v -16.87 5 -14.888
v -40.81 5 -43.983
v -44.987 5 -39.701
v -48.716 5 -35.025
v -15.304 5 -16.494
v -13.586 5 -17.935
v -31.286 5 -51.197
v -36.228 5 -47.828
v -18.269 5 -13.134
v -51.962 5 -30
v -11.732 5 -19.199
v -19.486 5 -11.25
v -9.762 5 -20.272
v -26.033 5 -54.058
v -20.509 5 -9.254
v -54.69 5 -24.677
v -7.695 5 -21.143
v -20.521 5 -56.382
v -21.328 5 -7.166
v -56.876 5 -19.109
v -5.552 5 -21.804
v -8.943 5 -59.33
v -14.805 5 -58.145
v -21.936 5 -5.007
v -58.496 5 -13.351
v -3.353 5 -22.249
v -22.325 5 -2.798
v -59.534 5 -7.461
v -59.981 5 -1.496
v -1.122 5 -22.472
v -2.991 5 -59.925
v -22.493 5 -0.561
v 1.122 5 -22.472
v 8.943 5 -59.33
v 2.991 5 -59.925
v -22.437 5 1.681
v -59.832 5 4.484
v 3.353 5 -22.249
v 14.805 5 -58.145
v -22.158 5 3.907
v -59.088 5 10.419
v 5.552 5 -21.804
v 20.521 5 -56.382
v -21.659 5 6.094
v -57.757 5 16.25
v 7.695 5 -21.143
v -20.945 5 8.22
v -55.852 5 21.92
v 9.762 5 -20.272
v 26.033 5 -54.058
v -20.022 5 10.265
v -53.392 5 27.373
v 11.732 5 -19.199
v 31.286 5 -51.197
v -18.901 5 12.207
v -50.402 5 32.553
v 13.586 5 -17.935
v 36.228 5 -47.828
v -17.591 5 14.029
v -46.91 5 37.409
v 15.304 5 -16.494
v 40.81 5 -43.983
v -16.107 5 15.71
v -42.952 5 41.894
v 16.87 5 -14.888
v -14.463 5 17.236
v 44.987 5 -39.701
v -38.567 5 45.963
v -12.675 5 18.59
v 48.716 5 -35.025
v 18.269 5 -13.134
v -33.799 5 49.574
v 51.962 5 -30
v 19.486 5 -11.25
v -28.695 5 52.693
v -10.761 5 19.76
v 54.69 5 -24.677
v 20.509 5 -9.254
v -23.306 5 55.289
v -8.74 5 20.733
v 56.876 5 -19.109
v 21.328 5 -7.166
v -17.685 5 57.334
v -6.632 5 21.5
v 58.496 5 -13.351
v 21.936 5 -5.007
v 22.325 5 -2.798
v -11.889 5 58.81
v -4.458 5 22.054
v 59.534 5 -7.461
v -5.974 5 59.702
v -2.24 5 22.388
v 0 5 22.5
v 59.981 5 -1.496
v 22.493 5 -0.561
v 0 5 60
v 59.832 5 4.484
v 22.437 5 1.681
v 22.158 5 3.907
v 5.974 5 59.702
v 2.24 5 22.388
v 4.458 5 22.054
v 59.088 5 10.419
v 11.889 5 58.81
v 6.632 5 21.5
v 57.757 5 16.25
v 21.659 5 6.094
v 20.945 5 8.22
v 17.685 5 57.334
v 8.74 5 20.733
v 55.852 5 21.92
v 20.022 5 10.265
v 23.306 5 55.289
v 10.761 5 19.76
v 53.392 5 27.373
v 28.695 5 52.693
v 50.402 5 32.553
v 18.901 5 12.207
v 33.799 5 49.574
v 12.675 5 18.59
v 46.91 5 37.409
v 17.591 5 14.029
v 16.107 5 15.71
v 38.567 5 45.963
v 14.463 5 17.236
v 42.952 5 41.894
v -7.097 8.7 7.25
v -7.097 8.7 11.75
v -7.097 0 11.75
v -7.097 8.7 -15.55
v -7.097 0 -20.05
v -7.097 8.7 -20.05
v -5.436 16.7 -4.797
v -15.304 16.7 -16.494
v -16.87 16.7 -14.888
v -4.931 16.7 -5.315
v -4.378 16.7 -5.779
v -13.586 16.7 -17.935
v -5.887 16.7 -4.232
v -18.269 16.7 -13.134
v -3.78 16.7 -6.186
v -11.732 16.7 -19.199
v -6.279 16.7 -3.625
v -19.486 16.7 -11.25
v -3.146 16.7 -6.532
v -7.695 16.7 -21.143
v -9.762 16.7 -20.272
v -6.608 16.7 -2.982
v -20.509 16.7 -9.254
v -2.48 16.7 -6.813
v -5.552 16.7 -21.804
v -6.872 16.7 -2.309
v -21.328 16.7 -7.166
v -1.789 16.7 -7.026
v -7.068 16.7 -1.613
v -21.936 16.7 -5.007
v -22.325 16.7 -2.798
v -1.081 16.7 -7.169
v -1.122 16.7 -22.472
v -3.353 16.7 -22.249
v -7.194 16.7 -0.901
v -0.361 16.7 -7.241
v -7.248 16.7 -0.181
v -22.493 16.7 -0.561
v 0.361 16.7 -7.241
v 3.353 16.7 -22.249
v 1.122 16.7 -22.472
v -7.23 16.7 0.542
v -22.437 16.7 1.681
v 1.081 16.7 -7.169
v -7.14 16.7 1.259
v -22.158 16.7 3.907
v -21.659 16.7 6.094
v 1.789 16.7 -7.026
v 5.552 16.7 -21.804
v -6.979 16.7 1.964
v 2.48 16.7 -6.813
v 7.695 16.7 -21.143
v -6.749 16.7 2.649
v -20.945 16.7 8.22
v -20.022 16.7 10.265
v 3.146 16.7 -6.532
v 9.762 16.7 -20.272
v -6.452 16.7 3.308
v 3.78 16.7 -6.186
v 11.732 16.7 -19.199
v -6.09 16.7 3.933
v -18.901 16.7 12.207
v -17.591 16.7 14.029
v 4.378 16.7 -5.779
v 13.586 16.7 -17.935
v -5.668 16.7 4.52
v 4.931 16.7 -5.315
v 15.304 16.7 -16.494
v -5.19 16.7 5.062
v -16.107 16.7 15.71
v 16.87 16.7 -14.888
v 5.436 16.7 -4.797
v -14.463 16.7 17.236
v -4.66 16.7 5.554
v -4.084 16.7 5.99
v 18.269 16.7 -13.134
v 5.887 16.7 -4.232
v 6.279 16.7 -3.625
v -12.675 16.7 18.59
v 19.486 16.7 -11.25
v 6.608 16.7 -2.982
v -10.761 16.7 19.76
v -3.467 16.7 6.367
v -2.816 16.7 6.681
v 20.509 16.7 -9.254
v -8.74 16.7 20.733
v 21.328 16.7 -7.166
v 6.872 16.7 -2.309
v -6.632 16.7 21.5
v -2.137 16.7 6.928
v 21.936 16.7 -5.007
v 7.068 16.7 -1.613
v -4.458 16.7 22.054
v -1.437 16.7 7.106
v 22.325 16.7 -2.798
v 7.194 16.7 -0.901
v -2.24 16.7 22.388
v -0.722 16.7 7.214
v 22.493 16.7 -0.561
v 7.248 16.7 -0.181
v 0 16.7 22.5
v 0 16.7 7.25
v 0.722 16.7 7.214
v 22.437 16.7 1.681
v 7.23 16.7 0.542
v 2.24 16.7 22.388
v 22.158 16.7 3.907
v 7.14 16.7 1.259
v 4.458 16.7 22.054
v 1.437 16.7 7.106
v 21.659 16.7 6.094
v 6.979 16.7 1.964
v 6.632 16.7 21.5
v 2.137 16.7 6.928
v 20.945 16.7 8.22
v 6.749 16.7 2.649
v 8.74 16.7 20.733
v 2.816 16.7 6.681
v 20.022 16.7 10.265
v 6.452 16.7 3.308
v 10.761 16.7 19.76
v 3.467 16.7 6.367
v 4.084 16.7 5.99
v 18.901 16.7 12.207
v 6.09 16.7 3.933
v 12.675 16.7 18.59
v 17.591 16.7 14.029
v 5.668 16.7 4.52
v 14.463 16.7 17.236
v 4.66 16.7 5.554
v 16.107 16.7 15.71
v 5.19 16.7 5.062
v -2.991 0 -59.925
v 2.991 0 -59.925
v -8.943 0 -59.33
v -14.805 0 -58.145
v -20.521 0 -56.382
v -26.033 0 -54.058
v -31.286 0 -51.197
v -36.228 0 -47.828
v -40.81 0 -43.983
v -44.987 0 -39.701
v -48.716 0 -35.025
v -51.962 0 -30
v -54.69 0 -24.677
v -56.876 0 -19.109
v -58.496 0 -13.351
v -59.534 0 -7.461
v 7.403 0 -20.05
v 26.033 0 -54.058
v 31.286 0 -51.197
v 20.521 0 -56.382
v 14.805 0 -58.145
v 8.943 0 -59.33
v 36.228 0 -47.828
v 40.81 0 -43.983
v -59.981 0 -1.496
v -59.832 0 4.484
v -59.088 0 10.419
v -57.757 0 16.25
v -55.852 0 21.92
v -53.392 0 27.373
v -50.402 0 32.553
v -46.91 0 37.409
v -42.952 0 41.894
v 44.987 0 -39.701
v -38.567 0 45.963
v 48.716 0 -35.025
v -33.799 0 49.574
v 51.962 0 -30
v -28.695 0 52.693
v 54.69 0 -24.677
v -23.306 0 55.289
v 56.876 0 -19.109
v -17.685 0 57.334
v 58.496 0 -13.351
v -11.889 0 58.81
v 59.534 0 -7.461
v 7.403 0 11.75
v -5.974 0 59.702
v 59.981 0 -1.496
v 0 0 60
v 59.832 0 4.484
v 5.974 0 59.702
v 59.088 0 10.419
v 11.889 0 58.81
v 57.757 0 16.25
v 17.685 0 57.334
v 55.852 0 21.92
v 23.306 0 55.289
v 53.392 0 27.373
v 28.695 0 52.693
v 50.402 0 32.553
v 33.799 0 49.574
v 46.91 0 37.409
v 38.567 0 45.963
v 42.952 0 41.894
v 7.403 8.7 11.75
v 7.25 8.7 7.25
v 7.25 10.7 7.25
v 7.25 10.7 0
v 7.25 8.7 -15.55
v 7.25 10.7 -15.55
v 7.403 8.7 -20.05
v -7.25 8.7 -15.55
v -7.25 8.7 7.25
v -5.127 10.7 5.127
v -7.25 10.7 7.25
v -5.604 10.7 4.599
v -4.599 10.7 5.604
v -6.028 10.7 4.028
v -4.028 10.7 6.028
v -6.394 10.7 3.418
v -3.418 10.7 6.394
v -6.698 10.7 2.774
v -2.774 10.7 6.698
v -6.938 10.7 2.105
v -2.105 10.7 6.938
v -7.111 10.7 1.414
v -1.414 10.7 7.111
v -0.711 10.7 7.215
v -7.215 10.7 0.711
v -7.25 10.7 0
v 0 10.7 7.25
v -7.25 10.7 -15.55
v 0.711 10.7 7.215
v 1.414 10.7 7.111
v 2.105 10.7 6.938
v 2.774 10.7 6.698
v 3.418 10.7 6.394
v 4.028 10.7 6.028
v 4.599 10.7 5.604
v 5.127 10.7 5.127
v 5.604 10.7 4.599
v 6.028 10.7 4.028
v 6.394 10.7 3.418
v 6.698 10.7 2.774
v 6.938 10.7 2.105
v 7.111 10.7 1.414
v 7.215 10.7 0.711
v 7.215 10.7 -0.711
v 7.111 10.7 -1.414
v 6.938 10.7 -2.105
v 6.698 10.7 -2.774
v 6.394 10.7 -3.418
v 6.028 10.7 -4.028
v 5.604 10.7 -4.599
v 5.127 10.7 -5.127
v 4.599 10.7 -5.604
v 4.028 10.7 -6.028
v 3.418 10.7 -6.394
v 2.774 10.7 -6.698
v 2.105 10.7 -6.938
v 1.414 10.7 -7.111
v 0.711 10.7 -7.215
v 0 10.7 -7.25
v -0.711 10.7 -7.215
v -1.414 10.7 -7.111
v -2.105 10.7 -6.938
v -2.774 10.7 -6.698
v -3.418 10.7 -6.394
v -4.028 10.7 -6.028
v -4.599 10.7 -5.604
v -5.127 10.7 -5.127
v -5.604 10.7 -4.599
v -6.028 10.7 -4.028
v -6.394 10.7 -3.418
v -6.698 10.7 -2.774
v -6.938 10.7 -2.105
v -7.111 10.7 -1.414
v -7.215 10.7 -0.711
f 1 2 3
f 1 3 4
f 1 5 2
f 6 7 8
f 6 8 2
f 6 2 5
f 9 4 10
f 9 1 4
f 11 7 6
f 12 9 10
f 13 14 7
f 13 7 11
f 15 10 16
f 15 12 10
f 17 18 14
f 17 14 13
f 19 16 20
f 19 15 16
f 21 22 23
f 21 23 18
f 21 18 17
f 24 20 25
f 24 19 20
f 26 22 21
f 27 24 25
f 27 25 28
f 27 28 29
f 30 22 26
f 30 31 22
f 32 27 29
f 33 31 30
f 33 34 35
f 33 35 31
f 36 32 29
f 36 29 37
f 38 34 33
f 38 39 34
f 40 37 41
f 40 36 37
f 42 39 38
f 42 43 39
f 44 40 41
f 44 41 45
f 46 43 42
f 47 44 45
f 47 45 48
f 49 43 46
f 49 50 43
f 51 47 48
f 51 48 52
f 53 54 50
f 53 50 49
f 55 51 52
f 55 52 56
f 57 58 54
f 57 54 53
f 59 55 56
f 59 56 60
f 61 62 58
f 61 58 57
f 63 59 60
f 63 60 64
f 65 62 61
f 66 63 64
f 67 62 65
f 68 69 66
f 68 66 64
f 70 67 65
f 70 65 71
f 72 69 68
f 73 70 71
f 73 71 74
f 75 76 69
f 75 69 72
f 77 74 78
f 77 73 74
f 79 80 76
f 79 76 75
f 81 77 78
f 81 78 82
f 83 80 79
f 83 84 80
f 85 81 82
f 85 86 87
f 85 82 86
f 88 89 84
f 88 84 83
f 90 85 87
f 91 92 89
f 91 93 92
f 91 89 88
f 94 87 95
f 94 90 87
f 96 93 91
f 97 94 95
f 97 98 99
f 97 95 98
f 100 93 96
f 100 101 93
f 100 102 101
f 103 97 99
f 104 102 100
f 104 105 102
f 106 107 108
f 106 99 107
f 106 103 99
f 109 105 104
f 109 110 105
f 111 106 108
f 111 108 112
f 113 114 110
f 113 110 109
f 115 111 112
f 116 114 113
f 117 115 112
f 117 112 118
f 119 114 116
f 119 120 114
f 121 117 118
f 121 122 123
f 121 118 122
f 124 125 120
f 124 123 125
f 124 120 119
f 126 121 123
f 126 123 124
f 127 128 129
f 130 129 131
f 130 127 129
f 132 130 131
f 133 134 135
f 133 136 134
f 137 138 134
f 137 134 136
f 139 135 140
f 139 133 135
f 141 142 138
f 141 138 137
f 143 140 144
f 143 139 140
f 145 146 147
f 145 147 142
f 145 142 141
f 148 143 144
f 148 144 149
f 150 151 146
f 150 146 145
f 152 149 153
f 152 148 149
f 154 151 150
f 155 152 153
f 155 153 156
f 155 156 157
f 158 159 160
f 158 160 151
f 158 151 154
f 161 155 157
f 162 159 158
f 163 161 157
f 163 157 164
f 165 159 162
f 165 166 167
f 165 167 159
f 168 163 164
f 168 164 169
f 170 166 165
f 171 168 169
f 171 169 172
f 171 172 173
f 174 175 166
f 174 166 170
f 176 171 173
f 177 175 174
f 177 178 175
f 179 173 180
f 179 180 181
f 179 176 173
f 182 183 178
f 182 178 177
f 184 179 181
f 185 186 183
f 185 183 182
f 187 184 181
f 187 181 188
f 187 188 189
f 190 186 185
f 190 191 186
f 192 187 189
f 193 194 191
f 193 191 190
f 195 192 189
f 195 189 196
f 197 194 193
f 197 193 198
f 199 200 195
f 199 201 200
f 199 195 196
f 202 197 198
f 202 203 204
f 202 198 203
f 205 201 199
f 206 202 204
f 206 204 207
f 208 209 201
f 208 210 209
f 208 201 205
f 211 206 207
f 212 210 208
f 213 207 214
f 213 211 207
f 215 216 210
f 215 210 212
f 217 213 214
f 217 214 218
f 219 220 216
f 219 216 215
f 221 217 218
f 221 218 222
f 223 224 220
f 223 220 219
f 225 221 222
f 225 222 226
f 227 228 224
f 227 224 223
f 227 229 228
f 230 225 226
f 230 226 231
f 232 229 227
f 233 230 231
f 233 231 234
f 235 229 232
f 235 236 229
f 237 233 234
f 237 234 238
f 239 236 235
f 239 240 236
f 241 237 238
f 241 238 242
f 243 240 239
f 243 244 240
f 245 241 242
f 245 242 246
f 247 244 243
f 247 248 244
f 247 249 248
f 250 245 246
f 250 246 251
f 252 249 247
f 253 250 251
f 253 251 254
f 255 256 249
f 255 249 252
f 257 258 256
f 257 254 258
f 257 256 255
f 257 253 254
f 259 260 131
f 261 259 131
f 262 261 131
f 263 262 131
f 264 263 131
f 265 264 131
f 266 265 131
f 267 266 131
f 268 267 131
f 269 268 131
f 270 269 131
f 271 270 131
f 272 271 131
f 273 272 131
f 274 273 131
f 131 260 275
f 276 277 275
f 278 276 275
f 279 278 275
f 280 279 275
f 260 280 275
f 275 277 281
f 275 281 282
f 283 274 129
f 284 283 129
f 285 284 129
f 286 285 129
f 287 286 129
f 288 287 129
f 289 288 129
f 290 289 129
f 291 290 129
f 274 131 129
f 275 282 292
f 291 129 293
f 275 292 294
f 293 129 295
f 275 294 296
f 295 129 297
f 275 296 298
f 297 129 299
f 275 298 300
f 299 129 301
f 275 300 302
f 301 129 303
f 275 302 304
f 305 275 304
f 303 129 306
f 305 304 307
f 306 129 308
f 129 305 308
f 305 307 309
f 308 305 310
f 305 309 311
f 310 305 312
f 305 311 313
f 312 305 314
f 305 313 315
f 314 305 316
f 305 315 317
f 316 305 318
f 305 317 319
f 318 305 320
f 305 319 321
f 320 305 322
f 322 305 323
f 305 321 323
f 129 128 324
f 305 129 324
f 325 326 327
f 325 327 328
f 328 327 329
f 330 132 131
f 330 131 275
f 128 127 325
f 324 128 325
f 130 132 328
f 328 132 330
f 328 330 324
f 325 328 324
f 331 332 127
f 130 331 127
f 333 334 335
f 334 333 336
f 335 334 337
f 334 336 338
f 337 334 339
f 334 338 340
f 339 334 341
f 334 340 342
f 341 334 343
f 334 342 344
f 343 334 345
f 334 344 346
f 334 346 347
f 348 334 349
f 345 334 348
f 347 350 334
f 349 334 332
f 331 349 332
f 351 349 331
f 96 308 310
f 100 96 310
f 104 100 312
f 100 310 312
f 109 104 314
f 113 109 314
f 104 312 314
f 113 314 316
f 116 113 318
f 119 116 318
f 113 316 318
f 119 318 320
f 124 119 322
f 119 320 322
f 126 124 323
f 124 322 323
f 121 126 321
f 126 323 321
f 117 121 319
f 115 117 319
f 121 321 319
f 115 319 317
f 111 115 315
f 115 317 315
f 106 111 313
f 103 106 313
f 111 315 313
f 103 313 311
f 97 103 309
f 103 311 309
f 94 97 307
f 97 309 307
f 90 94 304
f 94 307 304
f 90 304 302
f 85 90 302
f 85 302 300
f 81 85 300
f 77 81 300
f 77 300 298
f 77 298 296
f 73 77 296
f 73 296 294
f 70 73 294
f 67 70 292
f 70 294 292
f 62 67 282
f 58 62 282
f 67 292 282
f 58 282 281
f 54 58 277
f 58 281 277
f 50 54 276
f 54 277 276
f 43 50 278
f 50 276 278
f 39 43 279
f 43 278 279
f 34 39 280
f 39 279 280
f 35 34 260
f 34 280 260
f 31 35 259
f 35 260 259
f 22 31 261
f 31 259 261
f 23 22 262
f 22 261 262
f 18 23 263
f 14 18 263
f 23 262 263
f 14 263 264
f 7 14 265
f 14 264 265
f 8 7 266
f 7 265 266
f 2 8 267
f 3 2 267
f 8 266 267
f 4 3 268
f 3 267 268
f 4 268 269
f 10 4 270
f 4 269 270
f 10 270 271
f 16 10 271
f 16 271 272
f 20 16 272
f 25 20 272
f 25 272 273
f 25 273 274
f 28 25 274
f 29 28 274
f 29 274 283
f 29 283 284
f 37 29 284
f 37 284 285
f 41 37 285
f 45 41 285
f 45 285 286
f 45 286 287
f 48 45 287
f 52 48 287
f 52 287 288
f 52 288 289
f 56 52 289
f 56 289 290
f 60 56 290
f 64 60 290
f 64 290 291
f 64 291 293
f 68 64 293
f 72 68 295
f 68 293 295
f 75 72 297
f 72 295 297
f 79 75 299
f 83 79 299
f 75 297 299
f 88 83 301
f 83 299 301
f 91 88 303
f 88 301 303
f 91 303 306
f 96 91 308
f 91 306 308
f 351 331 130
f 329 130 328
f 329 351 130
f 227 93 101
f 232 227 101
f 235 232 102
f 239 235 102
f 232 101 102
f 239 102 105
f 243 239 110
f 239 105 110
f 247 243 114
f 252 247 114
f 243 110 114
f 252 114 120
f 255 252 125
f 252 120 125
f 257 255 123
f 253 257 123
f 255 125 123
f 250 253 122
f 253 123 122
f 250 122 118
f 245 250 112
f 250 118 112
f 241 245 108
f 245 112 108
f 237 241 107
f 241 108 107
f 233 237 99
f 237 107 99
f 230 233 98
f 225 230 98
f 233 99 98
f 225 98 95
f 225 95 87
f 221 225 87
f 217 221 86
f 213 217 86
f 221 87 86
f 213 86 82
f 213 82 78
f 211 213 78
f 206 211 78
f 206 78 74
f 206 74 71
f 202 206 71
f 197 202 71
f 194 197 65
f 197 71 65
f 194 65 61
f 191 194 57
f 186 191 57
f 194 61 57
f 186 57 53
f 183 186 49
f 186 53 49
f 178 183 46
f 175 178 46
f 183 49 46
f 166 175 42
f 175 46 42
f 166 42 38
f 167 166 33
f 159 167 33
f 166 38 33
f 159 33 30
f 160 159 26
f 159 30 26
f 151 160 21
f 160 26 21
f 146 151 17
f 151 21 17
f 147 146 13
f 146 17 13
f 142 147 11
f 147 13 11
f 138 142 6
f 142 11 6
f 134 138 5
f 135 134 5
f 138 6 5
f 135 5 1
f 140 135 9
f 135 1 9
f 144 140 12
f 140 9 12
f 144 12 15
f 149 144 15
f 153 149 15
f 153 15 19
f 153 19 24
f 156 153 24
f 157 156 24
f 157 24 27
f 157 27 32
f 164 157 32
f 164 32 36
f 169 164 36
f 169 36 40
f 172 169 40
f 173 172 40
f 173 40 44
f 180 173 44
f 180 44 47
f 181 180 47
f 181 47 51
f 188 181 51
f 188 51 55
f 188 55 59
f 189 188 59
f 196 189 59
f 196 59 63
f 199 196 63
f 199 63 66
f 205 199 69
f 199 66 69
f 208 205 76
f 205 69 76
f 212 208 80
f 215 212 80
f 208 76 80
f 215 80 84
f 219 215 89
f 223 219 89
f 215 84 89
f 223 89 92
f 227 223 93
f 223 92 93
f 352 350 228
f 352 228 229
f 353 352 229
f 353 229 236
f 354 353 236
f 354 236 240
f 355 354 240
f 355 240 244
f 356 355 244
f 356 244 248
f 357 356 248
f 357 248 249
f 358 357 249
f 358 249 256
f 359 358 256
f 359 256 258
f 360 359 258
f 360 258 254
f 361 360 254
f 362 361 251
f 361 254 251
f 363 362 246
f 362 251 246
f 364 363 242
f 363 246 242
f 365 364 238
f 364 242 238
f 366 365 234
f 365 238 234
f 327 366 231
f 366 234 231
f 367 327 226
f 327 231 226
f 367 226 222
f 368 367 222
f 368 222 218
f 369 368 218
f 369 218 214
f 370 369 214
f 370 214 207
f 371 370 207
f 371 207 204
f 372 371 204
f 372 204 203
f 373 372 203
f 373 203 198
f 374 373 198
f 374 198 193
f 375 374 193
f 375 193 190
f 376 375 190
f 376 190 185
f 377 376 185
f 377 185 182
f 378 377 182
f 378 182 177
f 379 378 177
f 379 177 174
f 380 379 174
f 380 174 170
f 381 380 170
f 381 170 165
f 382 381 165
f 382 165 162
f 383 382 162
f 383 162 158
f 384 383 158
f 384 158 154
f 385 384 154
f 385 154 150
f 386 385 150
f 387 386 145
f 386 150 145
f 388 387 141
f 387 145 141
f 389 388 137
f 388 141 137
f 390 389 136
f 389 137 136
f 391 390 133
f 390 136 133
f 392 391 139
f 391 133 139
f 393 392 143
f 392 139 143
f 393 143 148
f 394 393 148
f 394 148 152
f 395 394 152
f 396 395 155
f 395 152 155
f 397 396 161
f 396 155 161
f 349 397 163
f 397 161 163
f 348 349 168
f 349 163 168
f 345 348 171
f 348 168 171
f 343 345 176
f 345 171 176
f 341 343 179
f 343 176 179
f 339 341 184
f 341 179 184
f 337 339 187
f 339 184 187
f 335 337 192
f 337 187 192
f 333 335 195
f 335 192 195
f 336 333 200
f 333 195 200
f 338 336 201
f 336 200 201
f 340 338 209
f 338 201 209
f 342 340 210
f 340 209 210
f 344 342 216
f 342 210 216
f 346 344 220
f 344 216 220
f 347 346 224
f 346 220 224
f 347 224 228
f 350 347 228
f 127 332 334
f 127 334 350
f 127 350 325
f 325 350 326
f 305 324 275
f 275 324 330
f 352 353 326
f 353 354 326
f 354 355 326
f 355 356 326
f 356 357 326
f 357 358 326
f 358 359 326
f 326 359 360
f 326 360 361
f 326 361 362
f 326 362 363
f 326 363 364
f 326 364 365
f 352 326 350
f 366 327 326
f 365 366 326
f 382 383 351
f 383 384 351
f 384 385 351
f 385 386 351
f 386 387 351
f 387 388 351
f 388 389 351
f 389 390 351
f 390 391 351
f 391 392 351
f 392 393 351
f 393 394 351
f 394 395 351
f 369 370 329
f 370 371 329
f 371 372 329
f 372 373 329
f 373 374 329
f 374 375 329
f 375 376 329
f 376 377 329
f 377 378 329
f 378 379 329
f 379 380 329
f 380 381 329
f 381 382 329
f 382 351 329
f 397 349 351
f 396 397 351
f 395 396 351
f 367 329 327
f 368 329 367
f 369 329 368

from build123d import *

# Parameters (mm, degrees)
SKETCH1_R           = 60
BOSS_EXTRUDE1_DEPTH = 5
SKETCH2_R           = 22.5
BOSS_EXTRUDE3_DEPTH = 11.7
SKETCH6_R           = 7.25
CUT_EXTRUDE4_DEPTH  = 6
SKETCH7_W           = 14.5
SKETCH7_H           = 22.8
CUT_EXTRUDE5_DEPTH  = 2
SKETCH9_W           = 14.5
SKETCH9_H           = 31.8
CUT_EXTRUDE6_DEPTH  = 25


with BuildPart() as part:
    # Sketch1 → Boss-Extrude1 (new body)
    with BuildSketch(Plane(origin=(0, 0, 0), x_dir=(1, 0, 0), z_dir=(0, 1, 0))):
        with Locations(Location((0, 0, 0), (0, 0, 270))):
            Circle(SKETCH1_R)
    extrude(amount=BOSS_EXTRUDE1_DEPTH)

    # Sketch2 → Boss-Extrude3 (add)
    with BuildSketch(Plane(origin=(0, 5, 0), x_dir=(1, 0, 0), z_dir=(0, 1, 0))):
        with Locations(Location((0, 0, 0), (0, 0, 270))):
            Circle(SKETCH2_R)
    extrude(amount=BOSS_EXTRUDE3_DEPTH)

    # Sketch6 → Cut-Extrude4 (cut)
    with BuildSketch(Plane(origin=(0, 16.7, 0), x_dir=(1, 0, 0), z_dir=(0, 1, 0))):
        with Locations(Location((0, 0, 0), (0, 0, 270))):
            Circle(SKETCH6_R)
    extrude(amount=-CUT_EXTRUDE4_DEPTH, mode=Mode.SUBTRACT)

    # Sketch7 → Cut-Extrude5 (cut)
    with BuildSketch(Plane(origin=(0, 10.7, 0), x_dir=(1, 0, 0), z_dir=(0, 1, 0))):
        with Locations((0, 4.15)):
            Rectangle(SKETCH7_W, SKETCH7_H)
    extrude(amount=-CUT_EXTRUDE5_DEPTH, mode=Mode.SUBTRACT)

    # Sketch9 → Cut-Extrude6 (cut)
    with BuildSketch(Plane(origin=(0, 8.7, 0), x_dir=(1, 0, 0), z_dir=(0, 1, 0))):
        with Locations((0.153398413, 4.15)):
            Rectangle(SKETCH9_W, SKETCH9_H)
    extrude(amount=-CUT_EXTRUDE6_DEPTH, mode=Mode.SUBTRACT)


solid = part.part
